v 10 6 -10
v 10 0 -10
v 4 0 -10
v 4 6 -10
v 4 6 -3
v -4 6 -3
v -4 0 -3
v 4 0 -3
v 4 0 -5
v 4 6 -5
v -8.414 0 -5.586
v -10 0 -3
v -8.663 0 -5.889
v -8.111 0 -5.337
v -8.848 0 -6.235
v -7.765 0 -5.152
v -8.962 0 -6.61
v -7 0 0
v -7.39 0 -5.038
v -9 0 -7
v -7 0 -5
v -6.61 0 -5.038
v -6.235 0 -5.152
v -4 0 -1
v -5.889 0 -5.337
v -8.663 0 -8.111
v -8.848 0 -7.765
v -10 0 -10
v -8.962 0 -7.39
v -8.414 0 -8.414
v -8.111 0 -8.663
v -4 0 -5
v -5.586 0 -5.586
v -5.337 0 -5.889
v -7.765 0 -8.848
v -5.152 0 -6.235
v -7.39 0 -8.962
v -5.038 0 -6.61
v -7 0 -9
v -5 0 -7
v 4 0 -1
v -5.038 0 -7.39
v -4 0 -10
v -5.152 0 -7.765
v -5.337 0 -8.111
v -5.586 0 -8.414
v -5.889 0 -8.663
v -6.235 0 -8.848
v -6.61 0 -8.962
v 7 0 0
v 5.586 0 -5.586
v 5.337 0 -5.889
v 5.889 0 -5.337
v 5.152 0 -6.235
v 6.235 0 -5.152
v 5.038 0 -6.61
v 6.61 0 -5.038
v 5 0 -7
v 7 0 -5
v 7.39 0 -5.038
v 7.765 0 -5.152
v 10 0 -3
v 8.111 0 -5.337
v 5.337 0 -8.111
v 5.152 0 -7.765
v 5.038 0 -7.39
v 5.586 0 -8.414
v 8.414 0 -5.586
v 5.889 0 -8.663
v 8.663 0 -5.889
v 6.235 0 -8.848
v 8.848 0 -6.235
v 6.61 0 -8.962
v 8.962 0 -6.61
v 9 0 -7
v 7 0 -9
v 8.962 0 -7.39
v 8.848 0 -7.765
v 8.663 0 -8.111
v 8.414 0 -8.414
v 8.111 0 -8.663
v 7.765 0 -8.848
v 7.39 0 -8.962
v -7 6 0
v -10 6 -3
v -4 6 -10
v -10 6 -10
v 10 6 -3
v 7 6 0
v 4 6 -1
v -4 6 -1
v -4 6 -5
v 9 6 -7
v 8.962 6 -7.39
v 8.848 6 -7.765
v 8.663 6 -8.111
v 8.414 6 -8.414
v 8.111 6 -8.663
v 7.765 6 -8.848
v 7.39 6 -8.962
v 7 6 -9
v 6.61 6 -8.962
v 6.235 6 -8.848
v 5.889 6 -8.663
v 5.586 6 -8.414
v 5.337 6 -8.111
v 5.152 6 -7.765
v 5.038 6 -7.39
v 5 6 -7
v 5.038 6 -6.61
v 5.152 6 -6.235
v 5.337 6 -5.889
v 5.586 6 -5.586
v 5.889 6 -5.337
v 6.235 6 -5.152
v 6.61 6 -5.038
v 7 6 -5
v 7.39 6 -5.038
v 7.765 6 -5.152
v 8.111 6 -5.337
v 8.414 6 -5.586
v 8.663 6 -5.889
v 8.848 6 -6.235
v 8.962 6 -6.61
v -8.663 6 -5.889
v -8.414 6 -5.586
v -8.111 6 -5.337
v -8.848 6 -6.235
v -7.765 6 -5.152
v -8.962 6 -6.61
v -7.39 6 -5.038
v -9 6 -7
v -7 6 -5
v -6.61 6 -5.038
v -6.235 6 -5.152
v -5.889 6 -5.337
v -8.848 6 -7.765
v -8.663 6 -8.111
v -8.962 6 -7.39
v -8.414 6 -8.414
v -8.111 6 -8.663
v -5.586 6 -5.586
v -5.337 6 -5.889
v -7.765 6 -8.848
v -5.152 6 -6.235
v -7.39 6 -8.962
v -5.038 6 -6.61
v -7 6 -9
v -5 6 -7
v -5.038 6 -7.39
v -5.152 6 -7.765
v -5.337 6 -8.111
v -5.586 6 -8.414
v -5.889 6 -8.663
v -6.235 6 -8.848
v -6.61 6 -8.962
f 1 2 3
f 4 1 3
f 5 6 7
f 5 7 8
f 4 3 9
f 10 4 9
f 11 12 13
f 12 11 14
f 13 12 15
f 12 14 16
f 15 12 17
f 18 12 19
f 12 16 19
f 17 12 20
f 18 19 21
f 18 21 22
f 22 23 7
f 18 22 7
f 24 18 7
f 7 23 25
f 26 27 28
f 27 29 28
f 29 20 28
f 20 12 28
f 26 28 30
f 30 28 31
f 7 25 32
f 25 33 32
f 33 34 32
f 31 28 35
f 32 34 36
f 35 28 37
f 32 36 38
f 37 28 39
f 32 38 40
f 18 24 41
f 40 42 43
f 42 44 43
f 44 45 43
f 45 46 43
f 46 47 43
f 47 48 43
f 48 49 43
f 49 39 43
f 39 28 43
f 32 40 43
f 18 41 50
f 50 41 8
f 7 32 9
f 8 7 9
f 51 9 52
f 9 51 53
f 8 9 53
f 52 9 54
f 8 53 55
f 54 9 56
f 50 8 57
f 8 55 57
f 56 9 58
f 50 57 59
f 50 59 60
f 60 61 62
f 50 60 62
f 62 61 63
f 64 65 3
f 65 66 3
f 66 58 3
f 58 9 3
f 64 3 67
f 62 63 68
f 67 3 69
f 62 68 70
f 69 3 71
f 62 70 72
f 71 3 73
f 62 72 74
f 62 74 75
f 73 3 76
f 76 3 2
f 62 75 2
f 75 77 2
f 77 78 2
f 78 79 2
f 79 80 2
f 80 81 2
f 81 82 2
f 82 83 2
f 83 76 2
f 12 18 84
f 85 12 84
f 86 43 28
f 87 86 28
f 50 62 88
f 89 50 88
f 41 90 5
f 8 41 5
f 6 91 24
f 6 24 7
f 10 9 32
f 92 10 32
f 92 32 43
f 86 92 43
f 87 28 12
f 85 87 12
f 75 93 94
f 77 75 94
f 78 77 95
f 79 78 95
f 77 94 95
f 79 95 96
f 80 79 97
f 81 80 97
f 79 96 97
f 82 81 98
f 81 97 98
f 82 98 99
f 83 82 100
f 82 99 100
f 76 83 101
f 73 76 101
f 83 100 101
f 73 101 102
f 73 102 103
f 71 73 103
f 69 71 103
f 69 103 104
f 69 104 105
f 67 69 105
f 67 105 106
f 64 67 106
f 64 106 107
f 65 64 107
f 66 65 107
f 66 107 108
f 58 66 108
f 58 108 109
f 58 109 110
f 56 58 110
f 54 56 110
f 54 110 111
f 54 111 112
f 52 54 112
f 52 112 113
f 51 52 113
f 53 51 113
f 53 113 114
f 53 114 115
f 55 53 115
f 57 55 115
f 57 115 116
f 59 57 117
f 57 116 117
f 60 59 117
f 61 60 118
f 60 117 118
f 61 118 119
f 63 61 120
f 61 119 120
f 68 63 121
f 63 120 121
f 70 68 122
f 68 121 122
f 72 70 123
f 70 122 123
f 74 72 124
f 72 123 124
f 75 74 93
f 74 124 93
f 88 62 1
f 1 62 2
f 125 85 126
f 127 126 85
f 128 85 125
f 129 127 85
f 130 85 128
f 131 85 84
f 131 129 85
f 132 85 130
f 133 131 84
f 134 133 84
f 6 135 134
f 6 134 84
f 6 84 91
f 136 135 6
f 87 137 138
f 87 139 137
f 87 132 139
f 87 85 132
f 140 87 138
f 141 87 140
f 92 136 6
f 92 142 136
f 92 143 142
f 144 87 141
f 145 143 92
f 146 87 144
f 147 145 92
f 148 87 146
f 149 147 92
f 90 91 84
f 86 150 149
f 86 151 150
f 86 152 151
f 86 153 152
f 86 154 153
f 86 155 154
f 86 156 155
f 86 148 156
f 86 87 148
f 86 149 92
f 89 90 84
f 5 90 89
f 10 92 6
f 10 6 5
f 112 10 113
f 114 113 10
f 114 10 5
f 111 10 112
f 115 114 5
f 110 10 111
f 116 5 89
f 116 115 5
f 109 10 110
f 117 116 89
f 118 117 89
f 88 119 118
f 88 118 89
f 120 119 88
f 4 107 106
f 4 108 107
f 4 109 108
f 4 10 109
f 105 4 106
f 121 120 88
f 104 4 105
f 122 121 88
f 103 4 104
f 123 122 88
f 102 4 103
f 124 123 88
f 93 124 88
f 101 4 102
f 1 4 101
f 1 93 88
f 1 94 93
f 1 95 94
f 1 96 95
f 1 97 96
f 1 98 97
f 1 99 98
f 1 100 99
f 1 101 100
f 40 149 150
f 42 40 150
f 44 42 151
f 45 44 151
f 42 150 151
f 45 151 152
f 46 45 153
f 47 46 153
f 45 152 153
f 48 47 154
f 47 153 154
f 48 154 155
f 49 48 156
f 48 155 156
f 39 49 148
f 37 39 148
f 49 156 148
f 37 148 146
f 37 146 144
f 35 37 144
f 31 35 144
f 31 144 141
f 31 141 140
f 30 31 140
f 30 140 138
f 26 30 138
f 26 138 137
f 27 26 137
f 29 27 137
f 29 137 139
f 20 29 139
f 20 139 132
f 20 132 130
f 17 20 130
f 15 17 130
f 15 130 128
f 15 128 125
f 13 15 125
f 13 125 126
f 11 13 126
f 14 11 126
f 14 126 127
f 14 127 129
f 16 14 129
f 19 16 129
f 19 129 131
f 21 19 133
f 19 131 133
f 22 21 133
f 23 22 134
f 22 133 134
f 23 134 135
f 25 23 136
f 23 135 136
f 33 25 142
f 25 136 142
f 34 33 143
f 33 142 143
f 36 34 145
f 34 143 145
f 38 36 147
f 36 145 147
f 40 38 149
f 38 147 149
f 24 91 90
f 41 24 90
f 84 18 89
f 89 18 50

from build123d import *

# Parameters (mm, degrees)
EXTRUDE_1_DEPTH     = 6
CUT_EXTRUDE_3_REACH = 8
SKETCH_2_R          = 2
SKETCH_2_W          = 8
SKETCH_2_H          = 2
CHAMFER_1_SIZE      = 3


with BuildPart() as part:
    # 草图1 → 凸台-拉伸1 (new body)
    with BuildSketch(Plane(origin=(0, 0, 0), x_dir=(1, 0, 0), z_dir=(0, 1, 0))):
        Polygon((-4, 5), (-4, 10), (-10, 10), (-10, 5), (-10, 0), (10, 0), (10, 5), (10, 10), (4, 10), (4, 5), align=None)
    extrude(amount=EXTRUDE_1_DEPTH)

    # 草图2 → 切除-拉伸3 (cut, up to next)
    with BuildSketch(Plane(origin=(0, 6, 0), x_dir=(1, 0, 0), z_dir=(0, 1, 0)), mode=Mode.PRIVATE) as cut_extrude_3_sk1:
        with Locations((-7, 7)):
            Circle(SKETCH_2_R)
    cut_extrude_3_tool1 = extrude(cut_extrude_3_sk1.sketch, amount=-CUT_EXTRUDE_3_REACH, mode=Mode.PRIVATE) & part.part
    add(cut_extrude_3_tool1.solids().sort_by_distance((-7, 6, -7))[0], mode=Mode.SUBTRACT)
    # 草图2 → 切除-拉伸3 (cut, up to next)
    with BuildSketch(Plane(origin=(0, 6, 0), x_dir=(1, 0, 0), z_dir=(0, 1, 0)), mode=Mode.PRIVATE) as cut_extrude_3_sk2:
        with Locations((7, 7)):
            Circle(SKETCH_2_R)
    cut_extrude_3_tool2 = extrude(cut_extrude_3_sk2.sketch, amount=-CUT_EXTRUDE_3_REACH, mode=Mode.PRIVATE) & part.part
    add(cut_extrude_3_tool2.solids().sort_by_distance((7, 6, -7))[0], mode=Mode.SUBTRACT)
    # 草图2 → 切除-拉伸3 (cut, up to next)
    with BuildSketch(Plane(origin=(0, 6, 0), x_dir=(1, 0, 0), z_dir=(0, 1, 0)), mode=Mode.PRIVATE) as cut_extrude_3_sk3:
        with Locations((0, 2)):
            Rectangle(SKETCH_2_W, SKETCH_2_H)
    cut_extrude_3_tool3 = extrude(cut_extrude_3_sk3.sketch, amount=-CUT_EXTRUDE_3_REACH, mode=Mode.PRIVATE) & part.part
    add(cut_extrude_3_tool3.solids().sort_by_distance((0, 6, -2))[0], mode=Mode.SUBTRACT)

    # 倒角1
    chamfer_1_edges = [part.edges().sort_by_distance(p)[0] for p in [
        (10, 3, 0),
        (-10, 3, 0),
    ]]
    chamfer(chamfer_1_edges, length=CHAMFER_1_SIZE)


solid = part.part
